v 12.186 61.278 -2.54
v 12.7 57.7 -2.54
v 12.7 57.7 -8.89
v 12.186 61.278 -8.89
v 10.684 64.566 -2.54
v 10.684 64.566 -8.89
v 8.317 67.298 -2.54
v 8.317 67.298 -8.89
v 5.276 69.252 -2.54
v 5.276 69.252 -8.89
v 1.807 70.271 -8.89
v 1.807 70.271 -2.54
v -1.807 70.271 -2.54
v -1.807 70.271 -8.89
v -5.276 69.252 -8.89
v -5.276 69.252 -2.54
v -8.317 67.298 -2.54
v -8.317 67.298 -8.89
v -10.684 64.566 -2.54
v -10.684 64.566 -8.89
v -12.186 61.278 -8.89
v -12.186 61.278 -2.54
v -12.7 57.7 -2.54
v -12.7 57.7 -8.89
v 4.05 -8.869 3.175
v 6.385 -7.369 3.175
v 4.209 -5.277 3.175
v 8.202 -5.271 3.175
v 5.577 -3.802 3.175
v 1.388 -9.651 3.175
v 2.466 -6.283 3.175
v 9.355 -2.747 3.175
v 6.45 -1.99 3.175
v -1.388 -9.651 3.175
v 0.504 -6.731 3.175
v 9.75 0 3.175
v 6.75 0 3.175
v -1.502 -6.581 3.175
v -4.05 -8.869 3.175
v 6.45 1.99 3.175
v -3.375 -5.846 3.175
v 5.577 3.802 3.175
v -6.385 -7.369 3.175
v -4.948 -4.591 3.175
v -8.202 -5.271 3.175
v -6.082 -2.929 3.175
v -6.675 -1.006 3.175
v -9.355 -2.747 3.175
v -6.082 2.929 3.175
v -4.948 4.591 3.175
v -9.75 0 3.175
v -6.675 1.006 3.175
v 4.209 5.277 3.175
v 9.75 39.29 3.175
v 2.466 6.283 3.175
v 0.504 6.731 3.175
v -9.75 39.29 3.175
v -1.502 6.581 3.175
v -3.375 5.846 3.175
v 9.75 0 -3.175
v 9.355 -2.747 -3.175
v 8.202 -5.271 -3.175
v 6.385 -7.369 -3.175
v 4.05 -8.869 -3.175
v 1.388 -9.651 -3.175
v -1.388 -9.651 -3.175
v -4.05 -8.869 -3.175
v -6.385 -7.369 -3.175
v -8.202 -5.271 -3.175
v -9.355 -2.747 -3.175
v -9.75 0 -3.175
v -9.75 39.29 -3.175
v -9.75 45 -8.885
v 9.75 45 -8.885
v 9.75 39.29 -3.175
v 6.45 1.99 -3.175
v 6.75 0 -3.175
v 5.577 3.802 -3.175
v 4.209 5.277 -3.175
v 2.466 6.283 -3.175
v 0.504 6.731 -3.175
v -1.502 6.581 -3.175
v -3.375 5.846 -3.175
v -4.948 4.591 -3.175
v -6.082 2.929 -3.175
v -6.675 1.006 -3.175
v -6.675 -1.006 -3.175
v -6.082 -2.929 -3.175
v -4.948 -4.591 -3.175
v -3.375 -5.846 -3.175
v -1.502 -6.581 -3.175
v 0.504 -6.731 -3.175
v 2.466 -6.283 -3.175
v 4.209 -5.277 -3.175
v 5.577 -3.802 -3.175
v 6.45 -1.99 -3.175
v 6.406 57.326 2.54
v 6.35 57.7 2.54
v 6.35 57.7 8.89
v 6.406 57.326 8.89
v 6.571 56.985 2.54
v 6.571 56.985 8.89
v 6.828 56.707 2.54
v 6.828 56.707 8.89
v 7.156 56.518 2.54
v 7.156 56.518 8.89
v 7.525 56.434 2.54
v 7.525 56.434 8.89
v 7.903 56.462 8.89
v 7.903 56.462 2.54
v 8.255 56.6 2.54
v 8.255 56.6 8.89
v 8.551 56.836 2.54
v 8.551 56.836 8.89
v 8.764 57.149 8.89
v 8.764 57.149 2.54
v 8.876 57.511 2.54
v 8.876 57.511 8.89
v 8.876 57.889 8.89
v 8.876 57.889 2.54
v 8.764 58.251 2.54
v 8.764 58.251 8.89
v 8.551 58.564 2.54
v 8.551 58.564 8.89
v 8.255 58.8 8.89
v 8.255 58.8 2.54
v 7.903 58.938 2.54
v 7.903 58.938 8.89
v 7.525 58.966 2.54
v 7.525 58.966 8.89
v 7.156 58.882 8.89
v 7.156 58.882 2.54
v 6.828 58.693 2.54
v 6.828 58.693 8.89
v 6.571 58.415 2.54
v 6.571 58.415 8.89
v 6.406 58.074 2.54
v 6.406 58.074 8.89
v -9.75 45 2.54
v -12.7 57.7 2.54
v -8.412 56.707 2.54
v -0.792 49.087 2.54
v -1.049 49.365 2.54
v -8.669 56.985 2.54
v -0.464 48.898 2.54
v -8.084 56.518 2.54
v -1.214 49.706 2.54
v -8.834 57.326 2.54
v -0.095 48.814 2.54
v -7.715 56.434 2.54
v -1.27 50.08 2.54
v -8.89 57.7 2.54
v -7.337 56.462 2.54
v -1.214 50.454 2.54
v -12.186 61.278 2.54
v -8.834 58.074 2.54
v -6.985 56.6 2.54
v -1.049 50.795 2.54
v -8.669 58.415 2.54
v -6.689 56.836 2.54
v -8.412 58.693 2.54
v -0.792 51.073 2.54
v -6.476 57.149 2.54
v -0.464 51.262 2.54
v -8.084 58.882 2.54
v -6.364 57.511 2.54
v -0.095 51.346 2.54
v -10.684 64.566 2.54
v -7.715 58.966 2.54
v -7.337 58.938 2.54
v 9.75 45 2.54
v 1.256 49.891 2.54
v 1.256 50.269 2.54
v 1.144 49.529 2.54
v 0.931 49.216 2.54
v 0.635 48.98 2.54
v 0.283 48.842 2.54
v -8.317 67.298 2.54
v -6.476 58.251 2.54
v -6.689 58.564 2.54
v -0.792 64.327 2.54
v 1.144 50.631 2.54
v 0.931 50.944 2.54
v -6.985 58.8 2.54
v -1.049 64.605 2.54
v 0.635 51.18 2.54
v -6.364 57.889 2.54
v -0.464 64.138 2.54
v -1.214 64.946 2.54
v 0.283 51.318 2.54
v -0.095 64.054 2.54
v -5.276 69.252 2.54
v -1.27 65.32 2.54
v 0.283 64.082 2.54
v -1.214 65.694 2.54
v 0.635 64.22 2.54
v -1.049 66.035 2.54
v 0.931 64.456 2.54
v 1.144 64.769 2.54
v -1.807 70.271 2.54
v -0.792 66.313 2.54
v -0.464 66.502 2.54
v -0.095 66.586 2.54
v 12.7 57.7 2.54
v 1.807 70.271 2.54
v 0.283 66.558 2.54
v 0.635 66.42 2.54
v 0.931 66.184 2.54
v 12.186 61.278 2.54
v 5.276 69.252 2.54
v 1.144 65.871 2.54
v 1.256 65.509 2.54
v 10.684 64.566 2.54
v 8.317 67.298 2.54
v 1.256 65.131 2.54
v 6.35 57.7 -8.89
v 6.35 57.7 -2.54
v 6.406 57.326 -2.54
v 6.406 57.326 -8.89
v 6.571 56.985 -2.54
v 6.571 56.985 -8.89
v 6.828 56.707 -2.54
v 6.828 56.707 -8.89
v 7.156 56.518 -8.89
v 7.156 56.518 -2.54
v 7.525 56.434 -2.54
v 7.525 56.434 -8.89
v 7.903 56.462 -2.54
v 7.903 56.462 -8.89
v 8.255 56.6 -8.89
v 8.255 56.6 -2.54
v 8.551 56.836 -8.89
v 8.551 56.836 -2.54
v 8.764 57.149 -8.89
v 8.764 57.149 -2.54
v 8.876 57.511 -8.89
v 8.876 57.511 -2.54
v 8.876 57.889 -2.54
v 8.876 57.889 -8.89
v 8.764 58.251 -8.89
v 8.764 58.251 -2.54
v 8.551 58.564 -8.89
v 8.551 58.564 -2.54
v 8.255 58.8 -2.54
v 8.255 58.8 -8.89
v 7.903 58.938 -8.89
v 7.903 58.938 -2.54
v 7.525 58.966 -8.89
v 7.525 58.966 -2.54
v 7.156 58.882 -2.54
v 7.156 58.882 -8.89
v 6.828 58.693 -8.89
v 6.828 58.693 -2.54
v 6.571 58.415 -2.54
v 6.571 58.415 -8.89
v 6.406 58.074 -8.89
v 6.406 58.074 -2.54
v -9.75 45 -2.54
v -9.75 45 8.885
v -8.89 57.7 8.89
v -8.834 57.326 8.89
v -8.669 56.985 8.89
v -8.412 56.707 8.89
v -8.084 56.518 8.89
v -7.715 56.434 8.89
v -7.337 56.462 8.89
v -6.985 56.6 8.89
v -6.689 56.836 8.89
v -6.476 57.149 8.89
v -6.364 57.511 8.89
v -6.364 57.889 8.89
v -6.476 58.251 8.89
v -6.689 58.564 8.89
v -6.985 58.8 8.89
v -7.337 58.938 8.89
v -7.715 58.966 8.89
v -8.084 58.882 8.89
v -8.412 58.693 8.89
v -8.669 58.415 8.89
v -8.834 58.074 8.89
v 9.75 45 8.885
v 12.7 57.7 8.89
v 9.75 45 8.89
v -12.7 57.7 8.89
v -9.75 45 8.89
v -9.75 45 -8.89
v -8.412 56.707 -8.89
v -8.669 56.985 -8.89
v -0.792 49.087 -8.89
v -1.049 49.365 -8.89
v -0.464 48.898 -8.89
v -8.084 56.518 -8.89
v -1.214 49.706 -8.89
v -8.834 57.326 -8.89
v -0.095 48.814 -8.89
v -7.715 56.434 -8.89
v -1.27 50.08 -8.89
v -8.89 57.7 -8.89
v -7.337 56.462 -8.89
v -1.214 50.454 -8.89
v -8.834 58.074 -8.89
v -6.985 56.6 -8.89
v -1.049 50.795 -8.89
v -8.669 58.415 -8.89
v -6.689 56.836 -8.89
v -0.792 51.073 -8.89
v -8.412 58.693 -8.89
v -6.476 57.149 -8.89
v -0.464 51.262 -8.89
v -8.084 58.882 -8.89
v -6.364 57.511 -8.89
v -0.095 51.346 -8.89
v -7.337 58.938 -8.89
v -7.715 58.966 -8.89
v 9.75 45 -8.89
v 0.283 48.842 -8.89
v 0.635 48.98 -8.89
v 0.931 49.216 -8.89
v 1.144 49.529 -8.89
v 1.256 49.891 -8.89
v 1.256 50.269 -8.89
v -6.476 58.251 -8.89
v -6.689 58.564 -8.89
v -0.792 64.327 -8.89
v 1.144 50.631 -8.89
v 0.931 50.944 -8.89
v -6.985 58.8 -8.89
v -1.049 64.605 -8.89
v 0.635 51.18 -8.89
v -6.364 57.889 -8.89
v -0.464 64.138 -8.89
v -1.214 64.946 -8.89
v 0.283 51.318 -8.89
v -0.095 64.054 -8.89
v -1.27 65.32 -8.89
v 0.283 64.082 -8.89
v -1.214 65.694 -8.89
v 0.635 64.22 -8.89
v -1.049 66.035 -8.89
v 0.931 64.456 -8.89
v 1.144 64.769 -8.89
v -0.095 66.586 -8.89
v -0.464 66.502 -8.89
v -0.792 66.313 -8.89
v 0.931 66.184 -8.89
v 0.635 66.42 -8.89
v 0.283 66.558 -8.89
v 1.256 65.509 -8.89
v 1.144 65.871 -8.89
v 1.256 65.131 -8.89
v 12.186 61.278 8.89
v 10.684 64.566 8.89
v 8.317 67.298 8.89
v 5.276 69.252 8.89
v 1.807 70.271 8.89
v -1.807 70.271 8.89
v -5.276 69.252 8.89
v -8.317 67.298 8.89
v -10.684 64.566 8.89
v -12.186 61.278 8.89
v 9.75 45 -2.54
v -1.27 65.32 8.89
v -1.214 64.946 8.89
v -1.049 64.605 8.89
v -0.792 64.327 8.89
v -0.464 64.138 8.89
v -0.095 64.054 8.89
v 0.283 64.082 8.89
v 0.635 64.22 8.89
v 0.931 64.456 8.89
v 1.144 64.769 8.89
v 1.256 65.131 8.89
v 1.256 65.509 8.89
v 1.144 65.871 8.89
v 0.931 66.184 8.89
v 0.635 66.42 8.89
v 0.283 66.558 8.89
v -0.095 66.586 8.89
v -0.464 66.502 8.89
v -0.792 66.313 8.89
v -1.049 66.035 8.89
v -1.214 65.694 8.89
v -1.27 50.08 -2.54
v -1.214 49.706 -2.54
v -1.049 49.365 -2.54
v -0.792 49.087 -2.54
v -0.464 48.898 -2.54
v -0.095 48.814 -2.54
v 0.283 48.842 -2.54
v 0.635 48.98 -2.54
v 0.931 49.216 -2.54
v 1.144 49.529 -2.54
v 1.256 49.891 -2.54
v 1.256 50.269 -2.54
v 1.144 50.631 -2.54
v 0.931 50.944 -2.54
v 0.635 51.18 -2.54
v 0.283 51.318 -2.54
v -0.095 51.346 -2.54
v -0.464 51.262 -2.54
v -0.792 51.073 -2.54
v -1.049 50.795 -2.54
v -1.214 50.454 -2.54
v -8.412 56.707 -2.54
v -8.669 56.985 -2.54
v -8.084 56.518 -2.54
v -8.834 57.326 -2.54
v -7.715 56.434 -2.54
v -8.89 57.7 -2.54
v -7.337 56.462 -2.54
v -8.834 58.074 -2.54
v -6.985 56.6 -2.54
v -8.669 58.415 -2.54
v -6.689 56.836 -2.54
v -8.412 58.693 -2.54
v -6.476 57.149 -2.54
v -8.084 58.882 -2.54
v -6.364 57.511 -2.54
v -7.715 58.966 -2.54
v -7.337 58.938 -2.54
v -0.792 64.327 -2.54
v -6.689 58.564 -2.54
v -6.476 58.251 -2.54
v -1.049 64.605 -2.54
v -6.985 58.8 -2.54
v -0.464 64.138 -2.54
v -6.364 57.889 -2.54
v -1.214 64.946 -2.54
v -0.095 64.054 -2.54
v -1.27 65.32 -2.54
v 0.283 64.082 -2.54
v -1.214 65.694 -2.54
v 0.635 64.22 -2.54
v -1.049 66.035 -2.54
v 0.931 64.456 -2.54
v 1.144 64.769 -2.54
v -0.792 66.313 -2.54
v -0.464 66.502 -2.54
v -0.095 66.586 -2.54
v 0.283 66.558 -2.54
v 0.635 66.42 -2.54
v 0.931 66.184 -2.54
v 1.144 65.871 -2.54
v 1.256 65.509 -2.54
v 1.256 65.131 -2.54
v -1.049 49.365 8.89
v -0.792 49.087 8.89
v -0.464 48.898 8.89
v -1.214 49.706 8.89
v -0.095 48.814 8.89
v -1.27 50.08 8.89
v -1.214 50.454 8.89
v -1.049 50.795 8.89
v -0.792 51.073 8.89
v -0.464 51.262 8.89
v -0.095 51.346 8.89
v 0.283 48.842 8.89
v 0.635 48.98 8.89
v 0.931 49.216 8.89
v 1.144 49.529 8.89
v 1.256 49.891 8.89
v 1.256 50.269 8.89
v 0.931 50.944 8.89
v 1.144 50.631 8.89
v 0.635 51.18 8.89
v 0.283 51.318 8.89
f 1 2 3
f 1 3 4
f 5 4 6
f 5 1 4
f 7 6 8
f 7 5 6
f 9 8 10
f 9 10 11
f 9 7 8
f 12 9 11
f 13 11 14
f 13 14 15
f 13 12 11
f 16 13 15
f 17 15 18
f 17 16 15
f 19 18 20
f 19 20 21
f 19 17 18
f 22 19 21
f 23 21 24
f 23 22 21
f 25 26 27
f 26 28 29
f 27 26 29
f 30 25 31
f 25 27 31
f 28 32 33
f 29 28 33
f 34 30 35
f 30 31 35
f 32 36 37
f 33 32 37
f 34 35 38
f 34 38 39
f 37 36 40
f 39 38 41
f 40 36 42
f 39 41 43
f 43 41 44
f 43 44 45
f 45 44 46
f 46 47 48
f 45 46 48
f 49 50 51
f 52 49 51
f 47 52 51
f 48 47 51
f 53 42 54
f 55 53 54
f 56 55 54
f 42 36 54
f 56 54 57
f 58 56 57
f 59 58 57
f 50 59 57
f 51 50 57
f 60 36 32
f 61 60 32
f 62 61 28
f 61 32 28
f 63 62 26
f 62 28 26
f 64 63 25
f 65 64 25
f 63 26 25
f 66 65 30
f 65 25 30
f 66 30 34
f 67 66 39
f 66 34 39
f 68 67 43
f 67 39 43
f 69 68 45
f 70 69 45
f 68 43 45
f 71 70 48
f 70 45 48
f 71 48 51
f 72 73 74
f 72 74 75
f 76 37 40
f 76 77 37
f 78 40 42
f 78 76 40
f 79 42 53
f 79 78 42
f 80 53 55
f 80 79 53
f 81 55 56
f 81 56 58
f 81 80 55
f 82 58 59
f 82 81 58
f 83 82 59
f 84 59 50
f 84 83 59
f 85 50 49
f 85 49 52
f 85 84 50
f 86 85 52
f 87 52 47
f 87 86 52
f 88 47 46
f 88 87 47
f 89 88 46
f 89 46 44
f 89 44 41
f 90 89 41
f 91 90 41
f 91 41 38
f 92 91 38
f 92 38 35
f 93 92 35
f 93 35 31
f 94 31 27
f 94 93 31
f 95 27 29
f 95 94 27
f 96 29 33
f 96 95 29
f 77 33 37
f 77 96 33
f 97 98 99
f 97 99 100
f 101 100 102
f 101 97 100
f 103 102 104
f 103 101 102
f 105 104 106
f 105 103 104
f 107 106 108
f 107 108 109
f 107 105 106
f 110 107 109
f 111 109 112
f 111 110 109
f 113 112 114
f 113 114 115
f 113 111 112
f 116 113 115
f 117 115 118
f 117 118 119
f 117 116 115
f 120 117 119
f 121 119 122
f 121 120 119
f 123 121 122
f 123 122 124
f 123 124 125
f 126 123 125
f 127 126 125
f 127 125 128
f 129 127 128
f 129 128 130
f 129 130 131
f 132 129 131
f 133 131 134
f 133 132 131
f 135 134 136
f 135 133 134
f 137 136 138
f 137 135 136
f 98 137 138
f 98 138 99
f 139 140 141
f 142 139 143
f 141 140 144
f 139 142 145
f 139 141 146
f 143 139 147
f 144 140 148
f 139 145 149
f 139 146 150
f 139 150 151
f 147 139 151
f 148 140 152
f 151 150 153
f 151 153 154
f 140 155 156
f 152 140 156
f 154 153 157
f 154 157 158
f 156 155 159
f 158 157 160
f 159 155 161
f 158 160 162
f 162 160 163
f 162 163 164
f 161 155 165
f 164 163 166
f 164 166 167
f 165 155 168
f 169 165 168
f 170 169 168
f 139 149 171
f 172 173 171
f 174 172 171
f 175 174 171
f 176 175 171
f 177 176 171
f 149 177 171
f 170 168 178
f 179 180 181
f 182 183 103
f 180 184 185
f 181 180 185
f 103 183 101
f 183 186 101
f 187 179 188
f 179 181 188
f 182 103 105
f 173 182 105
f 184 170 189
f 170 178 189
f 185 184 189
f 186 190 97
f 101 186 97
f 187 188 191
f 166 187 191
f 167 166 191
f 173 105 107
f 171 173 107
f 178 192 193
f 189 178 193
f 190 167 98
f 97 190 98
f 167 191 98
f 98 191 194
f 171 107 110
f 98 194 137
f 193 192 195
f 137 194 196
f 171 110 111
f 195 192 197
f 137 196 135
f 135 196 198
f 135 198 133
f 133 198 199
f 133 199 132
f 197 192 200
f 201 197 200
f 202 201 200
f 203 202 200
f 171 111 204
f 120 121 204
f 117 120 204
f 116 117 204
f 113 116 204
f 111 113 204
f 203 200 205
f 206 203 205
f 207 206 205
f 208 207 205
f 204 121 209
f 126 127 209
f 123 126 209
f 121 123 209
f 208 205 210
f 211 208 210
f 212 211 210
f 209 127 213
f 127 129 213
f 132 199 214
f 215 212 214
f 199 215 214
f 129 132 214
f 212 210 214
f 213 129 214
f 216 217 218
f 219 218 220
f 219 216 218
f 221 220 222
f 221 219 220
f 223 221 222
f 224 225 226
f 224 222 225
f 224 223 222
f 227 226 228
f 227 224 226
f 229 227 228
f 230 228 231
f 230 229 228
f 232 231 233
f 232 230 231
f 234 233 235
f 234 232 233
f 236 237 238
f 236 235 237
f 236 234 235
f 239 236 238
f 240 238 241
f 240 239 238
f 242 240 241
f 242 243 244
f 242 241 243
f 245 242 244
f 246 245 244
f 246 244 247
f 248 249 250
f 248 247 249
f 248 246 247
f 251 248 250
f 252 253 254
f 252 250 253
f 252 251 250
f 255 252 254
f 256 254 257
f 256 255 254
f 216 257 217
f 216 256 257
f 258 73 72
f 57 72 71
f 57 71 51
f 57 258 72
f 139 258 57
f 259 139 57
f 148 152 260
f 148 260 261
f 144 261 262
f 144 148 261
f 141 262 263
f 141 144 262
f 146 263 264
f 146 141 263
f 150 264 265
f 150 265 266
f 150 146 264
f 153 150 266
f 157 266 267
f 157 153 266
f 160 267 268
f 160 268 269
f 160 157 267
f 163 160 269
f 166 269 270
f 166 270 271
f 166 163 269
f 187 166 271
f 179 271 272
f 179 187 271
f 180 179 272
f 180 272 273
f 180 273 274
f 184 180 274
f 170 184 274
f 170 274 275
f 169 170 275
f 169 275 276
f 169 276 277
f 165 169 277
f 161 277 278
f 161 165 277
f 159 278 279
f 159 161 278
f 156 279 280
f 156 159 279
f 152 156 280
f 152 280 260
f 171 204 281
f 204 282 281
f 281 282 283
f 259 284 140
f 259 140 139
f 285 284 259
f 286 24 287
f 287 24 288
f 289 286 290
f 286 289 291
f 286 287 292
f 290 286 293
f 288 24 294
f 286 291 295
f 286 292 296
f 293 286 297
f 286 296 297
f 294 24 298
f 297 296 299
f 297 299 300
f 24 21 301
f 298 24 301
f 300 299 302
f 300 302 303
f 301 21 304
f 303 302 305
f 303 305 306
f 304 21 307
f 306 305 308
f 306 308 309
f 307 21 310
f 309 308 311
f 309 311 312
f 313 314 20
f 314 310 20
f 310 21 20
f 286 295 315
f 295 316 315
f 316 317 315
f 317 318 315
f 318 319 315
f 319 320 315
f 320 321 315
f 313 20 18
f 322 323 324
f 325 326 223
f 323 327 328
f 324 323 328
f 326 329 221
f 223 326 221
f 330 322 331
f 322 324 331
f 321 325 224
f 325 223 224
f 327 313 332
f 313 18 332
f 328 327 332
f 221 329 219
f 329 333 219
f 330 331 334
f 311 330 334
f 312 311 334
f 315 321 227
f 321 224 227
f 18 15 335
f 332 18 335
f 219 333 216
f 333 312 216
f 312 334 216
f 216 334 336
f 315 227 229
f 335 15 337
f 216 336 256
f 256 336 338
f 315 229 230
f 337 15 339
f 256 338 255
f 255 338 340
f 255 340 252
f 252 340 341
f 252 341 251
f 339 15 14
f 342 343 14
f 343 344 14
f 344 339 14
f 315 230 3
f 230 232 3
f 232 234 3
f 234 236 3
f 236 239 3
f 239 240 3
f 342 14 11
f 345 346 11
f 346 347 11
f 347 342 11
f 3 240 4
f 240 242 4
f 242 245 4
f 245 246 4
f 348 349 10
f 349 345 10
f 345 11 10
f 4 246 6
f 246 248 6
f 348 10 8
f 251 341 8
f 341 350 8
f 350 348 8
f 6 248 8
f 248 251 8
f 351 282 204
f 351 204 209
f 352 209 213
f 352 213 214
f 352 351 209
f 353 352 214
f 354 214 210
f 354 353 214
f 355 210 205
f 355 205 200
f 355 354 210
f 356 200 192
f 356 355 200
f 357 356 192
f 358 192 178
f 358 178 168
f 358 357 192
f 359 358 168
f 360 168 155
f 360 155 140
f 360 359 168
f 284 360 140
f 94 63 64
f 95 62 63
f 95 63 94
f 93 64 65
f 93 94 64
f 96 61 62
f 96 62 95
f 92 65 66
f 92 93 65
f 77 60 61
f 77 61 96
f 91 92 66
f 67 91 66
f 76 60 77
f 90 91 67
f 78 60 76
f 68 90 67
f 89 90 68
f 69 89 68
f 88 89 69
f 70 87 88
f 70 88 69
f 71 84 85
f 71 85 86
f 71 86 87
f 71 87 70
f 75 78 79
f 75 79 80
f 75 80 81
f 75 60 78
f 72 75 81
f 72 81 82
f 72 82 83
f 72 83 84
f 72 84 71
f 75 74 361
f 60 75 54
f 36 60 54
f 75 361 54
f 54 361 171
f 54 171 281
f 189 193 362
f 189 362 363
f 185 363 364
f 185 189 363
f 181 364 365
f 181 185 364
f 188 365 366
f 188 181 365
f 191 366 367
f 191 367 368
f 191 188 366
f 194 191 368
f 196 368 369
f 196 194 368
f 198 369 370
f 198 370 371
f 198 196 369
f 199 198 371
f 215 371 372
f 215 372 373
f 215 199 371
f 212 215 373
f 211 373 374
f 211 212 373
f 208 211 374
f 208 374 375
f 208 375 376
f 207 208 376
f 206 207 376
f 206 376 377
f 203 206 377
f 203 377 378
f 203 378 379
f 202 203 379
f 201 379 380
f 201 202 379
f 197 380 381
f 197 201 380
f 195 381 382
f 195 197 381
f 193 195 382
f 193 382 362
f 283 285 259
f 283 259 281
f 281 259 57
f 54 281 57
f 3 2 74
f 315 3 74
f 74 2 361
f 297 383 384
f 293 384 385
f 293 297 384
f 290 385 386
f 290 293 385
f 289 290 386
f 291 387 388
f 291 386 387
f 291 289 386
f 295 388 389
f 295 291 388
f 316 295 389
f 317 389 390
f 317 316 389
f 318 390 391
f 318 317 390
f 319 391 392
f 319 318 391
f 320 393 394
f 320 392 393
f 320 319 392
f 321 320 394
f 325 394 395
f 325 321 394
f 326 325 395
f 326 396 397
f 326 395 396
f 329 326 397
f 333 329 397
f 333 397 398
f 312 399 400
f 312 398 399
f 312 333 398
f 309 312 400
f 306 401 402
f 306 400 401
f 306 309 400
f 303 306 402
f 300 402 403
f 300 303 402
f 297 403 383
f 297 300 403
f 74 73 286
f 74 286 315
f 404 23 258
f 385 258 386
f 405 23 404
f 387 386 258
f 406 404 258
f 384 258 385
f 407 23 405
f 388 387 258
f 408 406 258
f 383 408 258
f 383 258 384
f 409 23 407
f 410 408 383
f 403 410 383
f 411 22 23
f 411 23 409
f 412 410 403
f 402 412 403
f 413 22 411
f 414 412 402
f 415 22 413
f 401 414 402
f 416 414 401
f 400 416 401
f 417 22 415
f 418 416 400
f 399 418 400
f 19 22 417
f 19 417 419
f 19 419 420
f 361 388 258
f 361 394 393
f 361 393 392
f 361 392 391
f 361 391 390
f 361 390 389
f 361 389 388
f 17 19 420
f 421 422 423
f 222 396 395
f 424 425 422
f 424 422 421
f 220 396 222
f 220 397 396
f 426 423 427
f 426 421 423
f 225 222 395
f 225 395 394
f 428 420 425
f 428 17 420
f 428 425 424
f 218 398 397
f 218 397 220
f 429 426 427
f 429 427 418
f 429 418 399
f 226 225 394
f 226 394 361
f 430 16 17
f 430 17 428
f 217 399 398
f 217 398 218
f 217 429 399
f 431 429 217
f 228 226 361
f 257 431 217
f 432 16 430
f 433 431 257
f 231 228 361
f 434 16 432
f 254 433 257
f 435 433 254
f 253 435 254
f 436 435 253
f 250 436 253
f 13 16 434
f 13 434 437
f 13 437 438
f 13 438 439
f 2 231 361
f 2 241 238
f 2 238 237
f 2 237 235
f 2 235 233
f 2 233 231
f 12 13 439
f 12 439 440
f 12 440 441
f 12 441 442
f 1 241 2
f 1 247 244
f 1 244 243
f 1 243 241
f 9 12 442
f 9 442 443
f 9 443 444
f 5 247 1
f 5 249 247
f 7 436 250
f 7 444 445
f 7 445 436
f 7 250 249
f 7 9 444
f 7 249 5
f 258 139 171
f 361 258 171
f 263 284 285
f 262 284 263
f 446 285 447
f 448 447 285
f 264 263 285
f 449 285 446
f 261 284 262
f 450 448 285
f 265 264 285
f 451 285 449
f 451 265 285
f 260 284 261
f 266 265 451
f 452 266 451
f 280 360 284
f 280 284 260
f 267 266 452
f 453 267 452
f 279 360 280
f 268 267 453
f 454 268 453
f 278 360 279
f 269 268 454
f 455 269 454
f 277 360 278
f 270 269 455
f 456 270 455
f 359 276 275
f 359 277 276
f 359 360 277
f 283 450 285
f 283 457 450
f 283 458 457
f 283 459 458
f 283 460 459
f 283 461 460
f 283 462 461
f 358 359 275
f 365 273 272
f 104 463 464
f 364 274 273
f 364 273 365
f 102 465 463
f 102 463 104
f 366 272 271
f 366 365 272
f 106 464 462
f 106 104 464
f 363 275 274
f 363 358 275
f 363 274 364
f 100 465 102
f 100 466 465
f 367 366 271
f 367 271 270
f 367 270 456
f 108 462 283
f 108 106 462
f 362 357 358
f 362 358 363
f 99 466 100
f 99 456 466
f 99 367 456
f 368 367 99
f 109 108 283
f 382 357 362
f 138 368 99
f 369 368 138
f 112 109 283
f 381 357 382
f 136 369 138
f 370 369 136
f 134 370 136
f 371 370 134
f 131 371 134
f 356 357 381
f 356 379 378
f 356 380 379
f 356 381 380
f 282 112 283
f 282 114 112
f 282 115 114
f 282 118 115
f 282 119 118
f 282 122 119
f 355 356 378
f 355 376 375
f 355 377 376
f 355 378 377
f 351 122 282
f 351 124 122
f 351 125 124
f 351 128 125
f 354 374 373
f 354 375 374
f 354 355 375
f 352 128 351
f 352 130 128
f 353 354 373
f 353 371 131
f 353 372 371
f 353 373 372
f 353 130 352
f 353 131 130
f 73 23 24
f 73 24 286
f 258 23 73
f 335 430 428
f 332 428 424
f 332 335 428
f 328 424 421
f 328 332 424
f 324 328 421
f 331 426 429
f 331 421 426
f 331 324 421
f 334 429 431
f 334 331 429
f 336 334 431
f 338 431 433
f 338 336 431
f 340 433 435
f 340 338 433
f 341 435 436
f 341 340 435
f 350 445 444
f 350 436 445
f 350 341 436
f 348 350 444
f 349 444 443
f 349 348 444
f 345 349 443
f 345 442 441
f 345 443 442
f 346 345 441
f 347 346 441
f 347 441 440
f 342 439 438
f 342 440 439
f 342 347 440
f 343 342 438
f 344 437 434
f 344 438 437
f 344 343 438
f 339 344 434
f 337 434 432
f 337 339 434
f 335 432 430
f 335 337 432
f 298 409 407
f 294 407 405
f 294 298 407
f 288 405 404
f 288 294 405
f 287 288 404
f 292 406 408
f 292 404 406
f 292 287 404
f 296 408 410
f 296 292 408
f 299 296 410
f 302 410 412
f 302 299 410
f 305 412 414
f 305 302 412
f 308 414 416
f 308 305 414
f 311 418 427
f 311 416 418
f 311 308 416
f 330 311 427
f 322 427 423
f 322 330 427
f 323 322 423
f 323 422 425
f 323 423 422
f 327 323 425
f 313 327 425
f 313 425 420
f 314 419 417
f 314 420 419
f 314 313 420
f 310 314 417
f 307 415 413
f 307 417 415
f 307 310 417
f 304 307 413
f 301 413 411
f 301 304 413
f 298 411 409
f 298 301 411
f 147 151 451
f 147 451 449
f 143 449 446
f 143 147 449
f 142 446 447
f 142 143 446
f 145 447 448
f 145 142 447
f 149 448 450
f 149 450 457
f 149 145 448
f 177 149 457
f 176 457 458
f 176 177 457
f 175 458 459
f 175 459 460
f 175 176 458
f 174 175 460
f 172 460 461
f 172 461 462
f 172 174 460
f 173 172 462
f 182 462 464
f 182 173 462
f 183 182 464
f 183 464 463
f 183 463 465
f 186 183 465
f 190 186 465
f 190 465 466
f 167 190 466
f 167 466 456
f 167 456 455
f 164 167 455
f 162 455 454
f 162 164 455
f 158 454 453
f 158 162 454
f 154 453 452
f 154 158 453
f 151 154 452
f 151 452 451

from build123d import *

# Parameters (mm, degrees)
SKETCH1_R           = 6.75
BOSS_EXTRUDE1_DEPTH = 3.175
SKETCH4_R           = 1.27
BOSS_EXTRUDE2_DEPTH = 8.89
CHAMFER1_SIZE       = 5.71
CUT_EXTRUDE1_DEPTH  = 2.54


with BuildPart() as part:
    # Sketch1 → Boss-Extrude1 (new, symmetric)
    with BuildSketch(Plane.XY):
        with BuildLine():
            Line((-9.75, 0), (-9.75, 45))
            Line((-9.75, 45), (9.75, 45))
            Line((9.75, 45), (9.75, 0))
            ThreePointArc((9.75, 0), (0, -9.75), (-9.75, 0))
        make_face()
        Circle(SKETCH1_R, mode=Mode.SUBTRACT)
    extrude(amount=BOSS_EXTRUDE1_DEPTH, both=True)

    # Sketch4 → Boss-Extrude2 (add, symmetric)
    with BuildSketch(Plane.XY):
        with BuildLine():
            Line((-12.7, 57.7), (-9.75, 45))
            Line((-9.75, 45), (9.75, 45))
            Line((9.75, 45), (12.7, 57.7))
            ThreePointArc((12.7, 57.7), (0, 70.4), (-12.7, 57.7))
        make_face()
        with Locations(Location((0, 65.32, 0), (0, 0, 180))):
            Circle(SKETCH4_R, mode=Mode.SUBTRACT)
        with Locations(Location((7.62, 57.7, 0), (0, 0, 180))):
            Circle(SKETCH4_R, mode=Mode.SUBTRACT)
        with Locations(Location((0, 50.08, 0), (0, 0, 180))):
            Circle(SKETCH4_R, mode=Mode.SUBTRACT)
        with Locations(Location((-7.62, 57.7, 0), (0, 0, 180))):
            Circle(SKETCH4_R, mode=Mode.SUBTRACT)
    extrude(amount=BOSS_EXTRUDE2_DEPTH, both=True)

    # Chamfer1
    # the kernel refuses this chamfer: 5.71 mm, written as the material it adds along each edge
    with BuildSketch(Plane(origin=(-9.75, 45, 3.175), x_dir=(0, 0.02749587661058595, 0.9996219169112968), z_dir=(1, 0, 0))) as chamfer1_piece_1_section:
        Polygon((CHAMFER1_SIZE * 0.999621916911, CHAMFER1_SIZE * 0.0274958766106), (-CHAMFER1_SIZE * 0.0274958766106, CHAMFER1_SIZE * 0.999621916911), (0, 0), align=None)
    chamfer1_piece_1 = extrude(amount=19.5, mode=Mode.PRIVATE)
    chamfer1_piece_1 = split(chamfer1_piece_1, bisect_by=Plane(origin=(-9.076297476, 42.099653541, 4.47568677), z_dir=(-0.9740670228457147, -0.2262596627869977, 0)), keep=Keep.TOP, mode=Mode.PRIVATE)
    add(chamfer1_piece_1)
    with BuildSketch(Plane(origin=(-9.75, 45, 3.175), x_dir=(0, 0.02749587661058595, 0.9996219169112968), z_dir=(1, 0, 0))) as chamfer1_piece_2_section:
        Polygon((CHAMFER1_SIZE * 0.999621916911, CHAMFER1_SIZE * 0.0274958766106), (-CHAMFER1_SIZE * 0.0274958766106, CHAMFER1_SIZE * 0.999621916911), (0, 0), align=None)
    chamfer1_piece_2 = extrude(amount=19.5, mode=Mode.PRIVATE)
    chamfer1_piece_2 = split(chamfer1_piece_2, bisect_by=Plane(origin=(-8.84718109, 41.113288082, 5.085534979), z_dir=(0.9740670228457147, 0.2262596627869977, 0)), keep=Keep.TOP, mode=Mode.PRIVATE)
    chamfer1_piece_2 = split(chamfer1_piece_2, bisect_by=Plane(origin=(8.84718109, 41.113288082, 5.085534979), z_dir=(-0.9740670228457147, 0.2262596627869977, 0)), keep=Keep.TOP, mode=Mode.PRIVATE)
    add(chamfer1_piece_2)
    with BuildSketch(Plane(origin=(-9.75, 45, 3.175), x_dir=(0, 0.02749587661058595, 0.9996219169112968), z_dir=(1, 0, 0))) as chamfer1_piece_3_section:
        Polygon((CHAMFER1_SIZE * 0.999621916911, CHAMFER1_SIZE * 0.0274958766106), (-CHAMFER1_SIZE * 0.0274958766106, CHAMFER1_SIZE * 0.999621916911), (0, 0), align=None)
    chamfer1_piece_3 = extrude(amount=19.5, mode=Mode.PRIVATE)
    chamfer1_piece_3 = split(chamfer1_piece_3, bisect_by=Plane(origin=(9.076297476, 42.099653541, 4.47568677), z_dir=(0.9740670228457147, -0.2262596627869977, 0)), keep=Keep.TOP, mode=Mode.PRIVATE)
    add(chamfer1_piece_3)
    with BuildSketch(Plane(origin=(-9.75, 45, -3.175), x_dir=(0, 0.02749587661058595, -0.9996219169112968), z_dir=(1, 0, 0))) as chamfer1_piece_4_section:
        Polygon((CHAMFER1_SIZE * 0.999621916911, -CHAMFER1_SIZE * 0.0274958766106), (-CHAMFER1_SIZE * 0.0274958766106, -CHAMFER1_SIZE * 0.999621916911), (0, 0), align=None)
    chamfer1_piece_4 = extrude(amount=19.5, mode=Mode.PRIVATE)
    chamfer1_piece_4 = split(chamfer1_piece_4, bisect_by=Plane(origin=(-9.076297476, 42.099653541, -4.47568677), z_dir=(-0.9740670228457147, -0.2262596627869977, 0)), keep=Keep.TOP, mode=Mode.PRIVATE)
    add(chamfer1_piece_4)
    with BuildSketch(Plane(origin=(-9.75, 45, -3.175), x_dir=(0, 0.02749587661058595, -0.9996219169112968), z_dir=(1, 0, 0))) as chamfer1_piece_5_section:
        Polygon((CHAMFER1_SIZE * 0.999621916911, -CHAMFER1_SIZE * 0.0274958766106), (-CHAMFER1_SIZE * 0.0274958766106, -CHAMFER1_SIZE * 0.999621916911), (0, 0), align=None)
    chamfer1_piece_5 = extrude(amount=19.5, mode=Mode.PRIVATE)
    chamfer1_piece_5 = split(chamfer1_piece_5, bisect_by=Plane(origin=(-8.84718109, 41.113288082, -5.085534979), z_dir=(0.9740670228457147, 0.2262596627869977, 0)), keep=Keep.TOP, mode=Mode.PRIVATE)
    chamfer1_piece_5 = split(chamfer1_piece_5, bisect_by=Plane(origin=(8.84718109, 41.113288082, -5.085534979), z_dir=(-0.9740670228457147, 0.2262596627869977, 0)), keep=Keep.TOP, mode=Mode.PRIVATE)
    add(chamfer1_piece_5)
    with BuildSketch(Plane(origin=(-9.75, 45, -3.175), x_dir=(0, 0.02749587661058595, -0.9996219169112968), z_dir=(1, 0, 0))) as chamfer1_piece_6_section:
        Polygon((CHAMFER1_SIZE * 0.999621916911, -CHAMFER1_SIZE * 0.0274958766106), (-CHAMFER1_SIZE * 0.0274958766106, -CHAMFER1_SIZE * 0.999621916911), (0, 0), align=None)
    chamfer1_piece_6 = extrude(amount=19.5, mode=Mode.PRIVATE)
    chamfer1_piece_6 = split(chamfer1_piece_6, bisect_by=Plane(origin=(9.076297476, 42.099653541, -4.47568677), z_dir=(0.9740670228457147, -0.2262596627869977, 0)), keep=Keep.TOP, mode=Mode.PRIVATE)
    add(chamfer1_piece_6)

    # Sketch5 → Cut-Extrude1 (cut, symmetric)
    with BuildSketch(Plane.XY):
        with BuildLine():
            Line((-12.7, 57.7), (-9.75, 45))
            Line((-9.75, 45), (9.75, 45))
            Line((9.75, 45), (12.7, 57.7))
            ThreePointArc((12.7, 57.7), (0, 70.4), (-12.7, 57.7))
        make_face()
    extrude(amount=CUT_EXTRUDE1_DEPTH, both=True, mode=Mode.SUBTRACT)


solid = part.part
